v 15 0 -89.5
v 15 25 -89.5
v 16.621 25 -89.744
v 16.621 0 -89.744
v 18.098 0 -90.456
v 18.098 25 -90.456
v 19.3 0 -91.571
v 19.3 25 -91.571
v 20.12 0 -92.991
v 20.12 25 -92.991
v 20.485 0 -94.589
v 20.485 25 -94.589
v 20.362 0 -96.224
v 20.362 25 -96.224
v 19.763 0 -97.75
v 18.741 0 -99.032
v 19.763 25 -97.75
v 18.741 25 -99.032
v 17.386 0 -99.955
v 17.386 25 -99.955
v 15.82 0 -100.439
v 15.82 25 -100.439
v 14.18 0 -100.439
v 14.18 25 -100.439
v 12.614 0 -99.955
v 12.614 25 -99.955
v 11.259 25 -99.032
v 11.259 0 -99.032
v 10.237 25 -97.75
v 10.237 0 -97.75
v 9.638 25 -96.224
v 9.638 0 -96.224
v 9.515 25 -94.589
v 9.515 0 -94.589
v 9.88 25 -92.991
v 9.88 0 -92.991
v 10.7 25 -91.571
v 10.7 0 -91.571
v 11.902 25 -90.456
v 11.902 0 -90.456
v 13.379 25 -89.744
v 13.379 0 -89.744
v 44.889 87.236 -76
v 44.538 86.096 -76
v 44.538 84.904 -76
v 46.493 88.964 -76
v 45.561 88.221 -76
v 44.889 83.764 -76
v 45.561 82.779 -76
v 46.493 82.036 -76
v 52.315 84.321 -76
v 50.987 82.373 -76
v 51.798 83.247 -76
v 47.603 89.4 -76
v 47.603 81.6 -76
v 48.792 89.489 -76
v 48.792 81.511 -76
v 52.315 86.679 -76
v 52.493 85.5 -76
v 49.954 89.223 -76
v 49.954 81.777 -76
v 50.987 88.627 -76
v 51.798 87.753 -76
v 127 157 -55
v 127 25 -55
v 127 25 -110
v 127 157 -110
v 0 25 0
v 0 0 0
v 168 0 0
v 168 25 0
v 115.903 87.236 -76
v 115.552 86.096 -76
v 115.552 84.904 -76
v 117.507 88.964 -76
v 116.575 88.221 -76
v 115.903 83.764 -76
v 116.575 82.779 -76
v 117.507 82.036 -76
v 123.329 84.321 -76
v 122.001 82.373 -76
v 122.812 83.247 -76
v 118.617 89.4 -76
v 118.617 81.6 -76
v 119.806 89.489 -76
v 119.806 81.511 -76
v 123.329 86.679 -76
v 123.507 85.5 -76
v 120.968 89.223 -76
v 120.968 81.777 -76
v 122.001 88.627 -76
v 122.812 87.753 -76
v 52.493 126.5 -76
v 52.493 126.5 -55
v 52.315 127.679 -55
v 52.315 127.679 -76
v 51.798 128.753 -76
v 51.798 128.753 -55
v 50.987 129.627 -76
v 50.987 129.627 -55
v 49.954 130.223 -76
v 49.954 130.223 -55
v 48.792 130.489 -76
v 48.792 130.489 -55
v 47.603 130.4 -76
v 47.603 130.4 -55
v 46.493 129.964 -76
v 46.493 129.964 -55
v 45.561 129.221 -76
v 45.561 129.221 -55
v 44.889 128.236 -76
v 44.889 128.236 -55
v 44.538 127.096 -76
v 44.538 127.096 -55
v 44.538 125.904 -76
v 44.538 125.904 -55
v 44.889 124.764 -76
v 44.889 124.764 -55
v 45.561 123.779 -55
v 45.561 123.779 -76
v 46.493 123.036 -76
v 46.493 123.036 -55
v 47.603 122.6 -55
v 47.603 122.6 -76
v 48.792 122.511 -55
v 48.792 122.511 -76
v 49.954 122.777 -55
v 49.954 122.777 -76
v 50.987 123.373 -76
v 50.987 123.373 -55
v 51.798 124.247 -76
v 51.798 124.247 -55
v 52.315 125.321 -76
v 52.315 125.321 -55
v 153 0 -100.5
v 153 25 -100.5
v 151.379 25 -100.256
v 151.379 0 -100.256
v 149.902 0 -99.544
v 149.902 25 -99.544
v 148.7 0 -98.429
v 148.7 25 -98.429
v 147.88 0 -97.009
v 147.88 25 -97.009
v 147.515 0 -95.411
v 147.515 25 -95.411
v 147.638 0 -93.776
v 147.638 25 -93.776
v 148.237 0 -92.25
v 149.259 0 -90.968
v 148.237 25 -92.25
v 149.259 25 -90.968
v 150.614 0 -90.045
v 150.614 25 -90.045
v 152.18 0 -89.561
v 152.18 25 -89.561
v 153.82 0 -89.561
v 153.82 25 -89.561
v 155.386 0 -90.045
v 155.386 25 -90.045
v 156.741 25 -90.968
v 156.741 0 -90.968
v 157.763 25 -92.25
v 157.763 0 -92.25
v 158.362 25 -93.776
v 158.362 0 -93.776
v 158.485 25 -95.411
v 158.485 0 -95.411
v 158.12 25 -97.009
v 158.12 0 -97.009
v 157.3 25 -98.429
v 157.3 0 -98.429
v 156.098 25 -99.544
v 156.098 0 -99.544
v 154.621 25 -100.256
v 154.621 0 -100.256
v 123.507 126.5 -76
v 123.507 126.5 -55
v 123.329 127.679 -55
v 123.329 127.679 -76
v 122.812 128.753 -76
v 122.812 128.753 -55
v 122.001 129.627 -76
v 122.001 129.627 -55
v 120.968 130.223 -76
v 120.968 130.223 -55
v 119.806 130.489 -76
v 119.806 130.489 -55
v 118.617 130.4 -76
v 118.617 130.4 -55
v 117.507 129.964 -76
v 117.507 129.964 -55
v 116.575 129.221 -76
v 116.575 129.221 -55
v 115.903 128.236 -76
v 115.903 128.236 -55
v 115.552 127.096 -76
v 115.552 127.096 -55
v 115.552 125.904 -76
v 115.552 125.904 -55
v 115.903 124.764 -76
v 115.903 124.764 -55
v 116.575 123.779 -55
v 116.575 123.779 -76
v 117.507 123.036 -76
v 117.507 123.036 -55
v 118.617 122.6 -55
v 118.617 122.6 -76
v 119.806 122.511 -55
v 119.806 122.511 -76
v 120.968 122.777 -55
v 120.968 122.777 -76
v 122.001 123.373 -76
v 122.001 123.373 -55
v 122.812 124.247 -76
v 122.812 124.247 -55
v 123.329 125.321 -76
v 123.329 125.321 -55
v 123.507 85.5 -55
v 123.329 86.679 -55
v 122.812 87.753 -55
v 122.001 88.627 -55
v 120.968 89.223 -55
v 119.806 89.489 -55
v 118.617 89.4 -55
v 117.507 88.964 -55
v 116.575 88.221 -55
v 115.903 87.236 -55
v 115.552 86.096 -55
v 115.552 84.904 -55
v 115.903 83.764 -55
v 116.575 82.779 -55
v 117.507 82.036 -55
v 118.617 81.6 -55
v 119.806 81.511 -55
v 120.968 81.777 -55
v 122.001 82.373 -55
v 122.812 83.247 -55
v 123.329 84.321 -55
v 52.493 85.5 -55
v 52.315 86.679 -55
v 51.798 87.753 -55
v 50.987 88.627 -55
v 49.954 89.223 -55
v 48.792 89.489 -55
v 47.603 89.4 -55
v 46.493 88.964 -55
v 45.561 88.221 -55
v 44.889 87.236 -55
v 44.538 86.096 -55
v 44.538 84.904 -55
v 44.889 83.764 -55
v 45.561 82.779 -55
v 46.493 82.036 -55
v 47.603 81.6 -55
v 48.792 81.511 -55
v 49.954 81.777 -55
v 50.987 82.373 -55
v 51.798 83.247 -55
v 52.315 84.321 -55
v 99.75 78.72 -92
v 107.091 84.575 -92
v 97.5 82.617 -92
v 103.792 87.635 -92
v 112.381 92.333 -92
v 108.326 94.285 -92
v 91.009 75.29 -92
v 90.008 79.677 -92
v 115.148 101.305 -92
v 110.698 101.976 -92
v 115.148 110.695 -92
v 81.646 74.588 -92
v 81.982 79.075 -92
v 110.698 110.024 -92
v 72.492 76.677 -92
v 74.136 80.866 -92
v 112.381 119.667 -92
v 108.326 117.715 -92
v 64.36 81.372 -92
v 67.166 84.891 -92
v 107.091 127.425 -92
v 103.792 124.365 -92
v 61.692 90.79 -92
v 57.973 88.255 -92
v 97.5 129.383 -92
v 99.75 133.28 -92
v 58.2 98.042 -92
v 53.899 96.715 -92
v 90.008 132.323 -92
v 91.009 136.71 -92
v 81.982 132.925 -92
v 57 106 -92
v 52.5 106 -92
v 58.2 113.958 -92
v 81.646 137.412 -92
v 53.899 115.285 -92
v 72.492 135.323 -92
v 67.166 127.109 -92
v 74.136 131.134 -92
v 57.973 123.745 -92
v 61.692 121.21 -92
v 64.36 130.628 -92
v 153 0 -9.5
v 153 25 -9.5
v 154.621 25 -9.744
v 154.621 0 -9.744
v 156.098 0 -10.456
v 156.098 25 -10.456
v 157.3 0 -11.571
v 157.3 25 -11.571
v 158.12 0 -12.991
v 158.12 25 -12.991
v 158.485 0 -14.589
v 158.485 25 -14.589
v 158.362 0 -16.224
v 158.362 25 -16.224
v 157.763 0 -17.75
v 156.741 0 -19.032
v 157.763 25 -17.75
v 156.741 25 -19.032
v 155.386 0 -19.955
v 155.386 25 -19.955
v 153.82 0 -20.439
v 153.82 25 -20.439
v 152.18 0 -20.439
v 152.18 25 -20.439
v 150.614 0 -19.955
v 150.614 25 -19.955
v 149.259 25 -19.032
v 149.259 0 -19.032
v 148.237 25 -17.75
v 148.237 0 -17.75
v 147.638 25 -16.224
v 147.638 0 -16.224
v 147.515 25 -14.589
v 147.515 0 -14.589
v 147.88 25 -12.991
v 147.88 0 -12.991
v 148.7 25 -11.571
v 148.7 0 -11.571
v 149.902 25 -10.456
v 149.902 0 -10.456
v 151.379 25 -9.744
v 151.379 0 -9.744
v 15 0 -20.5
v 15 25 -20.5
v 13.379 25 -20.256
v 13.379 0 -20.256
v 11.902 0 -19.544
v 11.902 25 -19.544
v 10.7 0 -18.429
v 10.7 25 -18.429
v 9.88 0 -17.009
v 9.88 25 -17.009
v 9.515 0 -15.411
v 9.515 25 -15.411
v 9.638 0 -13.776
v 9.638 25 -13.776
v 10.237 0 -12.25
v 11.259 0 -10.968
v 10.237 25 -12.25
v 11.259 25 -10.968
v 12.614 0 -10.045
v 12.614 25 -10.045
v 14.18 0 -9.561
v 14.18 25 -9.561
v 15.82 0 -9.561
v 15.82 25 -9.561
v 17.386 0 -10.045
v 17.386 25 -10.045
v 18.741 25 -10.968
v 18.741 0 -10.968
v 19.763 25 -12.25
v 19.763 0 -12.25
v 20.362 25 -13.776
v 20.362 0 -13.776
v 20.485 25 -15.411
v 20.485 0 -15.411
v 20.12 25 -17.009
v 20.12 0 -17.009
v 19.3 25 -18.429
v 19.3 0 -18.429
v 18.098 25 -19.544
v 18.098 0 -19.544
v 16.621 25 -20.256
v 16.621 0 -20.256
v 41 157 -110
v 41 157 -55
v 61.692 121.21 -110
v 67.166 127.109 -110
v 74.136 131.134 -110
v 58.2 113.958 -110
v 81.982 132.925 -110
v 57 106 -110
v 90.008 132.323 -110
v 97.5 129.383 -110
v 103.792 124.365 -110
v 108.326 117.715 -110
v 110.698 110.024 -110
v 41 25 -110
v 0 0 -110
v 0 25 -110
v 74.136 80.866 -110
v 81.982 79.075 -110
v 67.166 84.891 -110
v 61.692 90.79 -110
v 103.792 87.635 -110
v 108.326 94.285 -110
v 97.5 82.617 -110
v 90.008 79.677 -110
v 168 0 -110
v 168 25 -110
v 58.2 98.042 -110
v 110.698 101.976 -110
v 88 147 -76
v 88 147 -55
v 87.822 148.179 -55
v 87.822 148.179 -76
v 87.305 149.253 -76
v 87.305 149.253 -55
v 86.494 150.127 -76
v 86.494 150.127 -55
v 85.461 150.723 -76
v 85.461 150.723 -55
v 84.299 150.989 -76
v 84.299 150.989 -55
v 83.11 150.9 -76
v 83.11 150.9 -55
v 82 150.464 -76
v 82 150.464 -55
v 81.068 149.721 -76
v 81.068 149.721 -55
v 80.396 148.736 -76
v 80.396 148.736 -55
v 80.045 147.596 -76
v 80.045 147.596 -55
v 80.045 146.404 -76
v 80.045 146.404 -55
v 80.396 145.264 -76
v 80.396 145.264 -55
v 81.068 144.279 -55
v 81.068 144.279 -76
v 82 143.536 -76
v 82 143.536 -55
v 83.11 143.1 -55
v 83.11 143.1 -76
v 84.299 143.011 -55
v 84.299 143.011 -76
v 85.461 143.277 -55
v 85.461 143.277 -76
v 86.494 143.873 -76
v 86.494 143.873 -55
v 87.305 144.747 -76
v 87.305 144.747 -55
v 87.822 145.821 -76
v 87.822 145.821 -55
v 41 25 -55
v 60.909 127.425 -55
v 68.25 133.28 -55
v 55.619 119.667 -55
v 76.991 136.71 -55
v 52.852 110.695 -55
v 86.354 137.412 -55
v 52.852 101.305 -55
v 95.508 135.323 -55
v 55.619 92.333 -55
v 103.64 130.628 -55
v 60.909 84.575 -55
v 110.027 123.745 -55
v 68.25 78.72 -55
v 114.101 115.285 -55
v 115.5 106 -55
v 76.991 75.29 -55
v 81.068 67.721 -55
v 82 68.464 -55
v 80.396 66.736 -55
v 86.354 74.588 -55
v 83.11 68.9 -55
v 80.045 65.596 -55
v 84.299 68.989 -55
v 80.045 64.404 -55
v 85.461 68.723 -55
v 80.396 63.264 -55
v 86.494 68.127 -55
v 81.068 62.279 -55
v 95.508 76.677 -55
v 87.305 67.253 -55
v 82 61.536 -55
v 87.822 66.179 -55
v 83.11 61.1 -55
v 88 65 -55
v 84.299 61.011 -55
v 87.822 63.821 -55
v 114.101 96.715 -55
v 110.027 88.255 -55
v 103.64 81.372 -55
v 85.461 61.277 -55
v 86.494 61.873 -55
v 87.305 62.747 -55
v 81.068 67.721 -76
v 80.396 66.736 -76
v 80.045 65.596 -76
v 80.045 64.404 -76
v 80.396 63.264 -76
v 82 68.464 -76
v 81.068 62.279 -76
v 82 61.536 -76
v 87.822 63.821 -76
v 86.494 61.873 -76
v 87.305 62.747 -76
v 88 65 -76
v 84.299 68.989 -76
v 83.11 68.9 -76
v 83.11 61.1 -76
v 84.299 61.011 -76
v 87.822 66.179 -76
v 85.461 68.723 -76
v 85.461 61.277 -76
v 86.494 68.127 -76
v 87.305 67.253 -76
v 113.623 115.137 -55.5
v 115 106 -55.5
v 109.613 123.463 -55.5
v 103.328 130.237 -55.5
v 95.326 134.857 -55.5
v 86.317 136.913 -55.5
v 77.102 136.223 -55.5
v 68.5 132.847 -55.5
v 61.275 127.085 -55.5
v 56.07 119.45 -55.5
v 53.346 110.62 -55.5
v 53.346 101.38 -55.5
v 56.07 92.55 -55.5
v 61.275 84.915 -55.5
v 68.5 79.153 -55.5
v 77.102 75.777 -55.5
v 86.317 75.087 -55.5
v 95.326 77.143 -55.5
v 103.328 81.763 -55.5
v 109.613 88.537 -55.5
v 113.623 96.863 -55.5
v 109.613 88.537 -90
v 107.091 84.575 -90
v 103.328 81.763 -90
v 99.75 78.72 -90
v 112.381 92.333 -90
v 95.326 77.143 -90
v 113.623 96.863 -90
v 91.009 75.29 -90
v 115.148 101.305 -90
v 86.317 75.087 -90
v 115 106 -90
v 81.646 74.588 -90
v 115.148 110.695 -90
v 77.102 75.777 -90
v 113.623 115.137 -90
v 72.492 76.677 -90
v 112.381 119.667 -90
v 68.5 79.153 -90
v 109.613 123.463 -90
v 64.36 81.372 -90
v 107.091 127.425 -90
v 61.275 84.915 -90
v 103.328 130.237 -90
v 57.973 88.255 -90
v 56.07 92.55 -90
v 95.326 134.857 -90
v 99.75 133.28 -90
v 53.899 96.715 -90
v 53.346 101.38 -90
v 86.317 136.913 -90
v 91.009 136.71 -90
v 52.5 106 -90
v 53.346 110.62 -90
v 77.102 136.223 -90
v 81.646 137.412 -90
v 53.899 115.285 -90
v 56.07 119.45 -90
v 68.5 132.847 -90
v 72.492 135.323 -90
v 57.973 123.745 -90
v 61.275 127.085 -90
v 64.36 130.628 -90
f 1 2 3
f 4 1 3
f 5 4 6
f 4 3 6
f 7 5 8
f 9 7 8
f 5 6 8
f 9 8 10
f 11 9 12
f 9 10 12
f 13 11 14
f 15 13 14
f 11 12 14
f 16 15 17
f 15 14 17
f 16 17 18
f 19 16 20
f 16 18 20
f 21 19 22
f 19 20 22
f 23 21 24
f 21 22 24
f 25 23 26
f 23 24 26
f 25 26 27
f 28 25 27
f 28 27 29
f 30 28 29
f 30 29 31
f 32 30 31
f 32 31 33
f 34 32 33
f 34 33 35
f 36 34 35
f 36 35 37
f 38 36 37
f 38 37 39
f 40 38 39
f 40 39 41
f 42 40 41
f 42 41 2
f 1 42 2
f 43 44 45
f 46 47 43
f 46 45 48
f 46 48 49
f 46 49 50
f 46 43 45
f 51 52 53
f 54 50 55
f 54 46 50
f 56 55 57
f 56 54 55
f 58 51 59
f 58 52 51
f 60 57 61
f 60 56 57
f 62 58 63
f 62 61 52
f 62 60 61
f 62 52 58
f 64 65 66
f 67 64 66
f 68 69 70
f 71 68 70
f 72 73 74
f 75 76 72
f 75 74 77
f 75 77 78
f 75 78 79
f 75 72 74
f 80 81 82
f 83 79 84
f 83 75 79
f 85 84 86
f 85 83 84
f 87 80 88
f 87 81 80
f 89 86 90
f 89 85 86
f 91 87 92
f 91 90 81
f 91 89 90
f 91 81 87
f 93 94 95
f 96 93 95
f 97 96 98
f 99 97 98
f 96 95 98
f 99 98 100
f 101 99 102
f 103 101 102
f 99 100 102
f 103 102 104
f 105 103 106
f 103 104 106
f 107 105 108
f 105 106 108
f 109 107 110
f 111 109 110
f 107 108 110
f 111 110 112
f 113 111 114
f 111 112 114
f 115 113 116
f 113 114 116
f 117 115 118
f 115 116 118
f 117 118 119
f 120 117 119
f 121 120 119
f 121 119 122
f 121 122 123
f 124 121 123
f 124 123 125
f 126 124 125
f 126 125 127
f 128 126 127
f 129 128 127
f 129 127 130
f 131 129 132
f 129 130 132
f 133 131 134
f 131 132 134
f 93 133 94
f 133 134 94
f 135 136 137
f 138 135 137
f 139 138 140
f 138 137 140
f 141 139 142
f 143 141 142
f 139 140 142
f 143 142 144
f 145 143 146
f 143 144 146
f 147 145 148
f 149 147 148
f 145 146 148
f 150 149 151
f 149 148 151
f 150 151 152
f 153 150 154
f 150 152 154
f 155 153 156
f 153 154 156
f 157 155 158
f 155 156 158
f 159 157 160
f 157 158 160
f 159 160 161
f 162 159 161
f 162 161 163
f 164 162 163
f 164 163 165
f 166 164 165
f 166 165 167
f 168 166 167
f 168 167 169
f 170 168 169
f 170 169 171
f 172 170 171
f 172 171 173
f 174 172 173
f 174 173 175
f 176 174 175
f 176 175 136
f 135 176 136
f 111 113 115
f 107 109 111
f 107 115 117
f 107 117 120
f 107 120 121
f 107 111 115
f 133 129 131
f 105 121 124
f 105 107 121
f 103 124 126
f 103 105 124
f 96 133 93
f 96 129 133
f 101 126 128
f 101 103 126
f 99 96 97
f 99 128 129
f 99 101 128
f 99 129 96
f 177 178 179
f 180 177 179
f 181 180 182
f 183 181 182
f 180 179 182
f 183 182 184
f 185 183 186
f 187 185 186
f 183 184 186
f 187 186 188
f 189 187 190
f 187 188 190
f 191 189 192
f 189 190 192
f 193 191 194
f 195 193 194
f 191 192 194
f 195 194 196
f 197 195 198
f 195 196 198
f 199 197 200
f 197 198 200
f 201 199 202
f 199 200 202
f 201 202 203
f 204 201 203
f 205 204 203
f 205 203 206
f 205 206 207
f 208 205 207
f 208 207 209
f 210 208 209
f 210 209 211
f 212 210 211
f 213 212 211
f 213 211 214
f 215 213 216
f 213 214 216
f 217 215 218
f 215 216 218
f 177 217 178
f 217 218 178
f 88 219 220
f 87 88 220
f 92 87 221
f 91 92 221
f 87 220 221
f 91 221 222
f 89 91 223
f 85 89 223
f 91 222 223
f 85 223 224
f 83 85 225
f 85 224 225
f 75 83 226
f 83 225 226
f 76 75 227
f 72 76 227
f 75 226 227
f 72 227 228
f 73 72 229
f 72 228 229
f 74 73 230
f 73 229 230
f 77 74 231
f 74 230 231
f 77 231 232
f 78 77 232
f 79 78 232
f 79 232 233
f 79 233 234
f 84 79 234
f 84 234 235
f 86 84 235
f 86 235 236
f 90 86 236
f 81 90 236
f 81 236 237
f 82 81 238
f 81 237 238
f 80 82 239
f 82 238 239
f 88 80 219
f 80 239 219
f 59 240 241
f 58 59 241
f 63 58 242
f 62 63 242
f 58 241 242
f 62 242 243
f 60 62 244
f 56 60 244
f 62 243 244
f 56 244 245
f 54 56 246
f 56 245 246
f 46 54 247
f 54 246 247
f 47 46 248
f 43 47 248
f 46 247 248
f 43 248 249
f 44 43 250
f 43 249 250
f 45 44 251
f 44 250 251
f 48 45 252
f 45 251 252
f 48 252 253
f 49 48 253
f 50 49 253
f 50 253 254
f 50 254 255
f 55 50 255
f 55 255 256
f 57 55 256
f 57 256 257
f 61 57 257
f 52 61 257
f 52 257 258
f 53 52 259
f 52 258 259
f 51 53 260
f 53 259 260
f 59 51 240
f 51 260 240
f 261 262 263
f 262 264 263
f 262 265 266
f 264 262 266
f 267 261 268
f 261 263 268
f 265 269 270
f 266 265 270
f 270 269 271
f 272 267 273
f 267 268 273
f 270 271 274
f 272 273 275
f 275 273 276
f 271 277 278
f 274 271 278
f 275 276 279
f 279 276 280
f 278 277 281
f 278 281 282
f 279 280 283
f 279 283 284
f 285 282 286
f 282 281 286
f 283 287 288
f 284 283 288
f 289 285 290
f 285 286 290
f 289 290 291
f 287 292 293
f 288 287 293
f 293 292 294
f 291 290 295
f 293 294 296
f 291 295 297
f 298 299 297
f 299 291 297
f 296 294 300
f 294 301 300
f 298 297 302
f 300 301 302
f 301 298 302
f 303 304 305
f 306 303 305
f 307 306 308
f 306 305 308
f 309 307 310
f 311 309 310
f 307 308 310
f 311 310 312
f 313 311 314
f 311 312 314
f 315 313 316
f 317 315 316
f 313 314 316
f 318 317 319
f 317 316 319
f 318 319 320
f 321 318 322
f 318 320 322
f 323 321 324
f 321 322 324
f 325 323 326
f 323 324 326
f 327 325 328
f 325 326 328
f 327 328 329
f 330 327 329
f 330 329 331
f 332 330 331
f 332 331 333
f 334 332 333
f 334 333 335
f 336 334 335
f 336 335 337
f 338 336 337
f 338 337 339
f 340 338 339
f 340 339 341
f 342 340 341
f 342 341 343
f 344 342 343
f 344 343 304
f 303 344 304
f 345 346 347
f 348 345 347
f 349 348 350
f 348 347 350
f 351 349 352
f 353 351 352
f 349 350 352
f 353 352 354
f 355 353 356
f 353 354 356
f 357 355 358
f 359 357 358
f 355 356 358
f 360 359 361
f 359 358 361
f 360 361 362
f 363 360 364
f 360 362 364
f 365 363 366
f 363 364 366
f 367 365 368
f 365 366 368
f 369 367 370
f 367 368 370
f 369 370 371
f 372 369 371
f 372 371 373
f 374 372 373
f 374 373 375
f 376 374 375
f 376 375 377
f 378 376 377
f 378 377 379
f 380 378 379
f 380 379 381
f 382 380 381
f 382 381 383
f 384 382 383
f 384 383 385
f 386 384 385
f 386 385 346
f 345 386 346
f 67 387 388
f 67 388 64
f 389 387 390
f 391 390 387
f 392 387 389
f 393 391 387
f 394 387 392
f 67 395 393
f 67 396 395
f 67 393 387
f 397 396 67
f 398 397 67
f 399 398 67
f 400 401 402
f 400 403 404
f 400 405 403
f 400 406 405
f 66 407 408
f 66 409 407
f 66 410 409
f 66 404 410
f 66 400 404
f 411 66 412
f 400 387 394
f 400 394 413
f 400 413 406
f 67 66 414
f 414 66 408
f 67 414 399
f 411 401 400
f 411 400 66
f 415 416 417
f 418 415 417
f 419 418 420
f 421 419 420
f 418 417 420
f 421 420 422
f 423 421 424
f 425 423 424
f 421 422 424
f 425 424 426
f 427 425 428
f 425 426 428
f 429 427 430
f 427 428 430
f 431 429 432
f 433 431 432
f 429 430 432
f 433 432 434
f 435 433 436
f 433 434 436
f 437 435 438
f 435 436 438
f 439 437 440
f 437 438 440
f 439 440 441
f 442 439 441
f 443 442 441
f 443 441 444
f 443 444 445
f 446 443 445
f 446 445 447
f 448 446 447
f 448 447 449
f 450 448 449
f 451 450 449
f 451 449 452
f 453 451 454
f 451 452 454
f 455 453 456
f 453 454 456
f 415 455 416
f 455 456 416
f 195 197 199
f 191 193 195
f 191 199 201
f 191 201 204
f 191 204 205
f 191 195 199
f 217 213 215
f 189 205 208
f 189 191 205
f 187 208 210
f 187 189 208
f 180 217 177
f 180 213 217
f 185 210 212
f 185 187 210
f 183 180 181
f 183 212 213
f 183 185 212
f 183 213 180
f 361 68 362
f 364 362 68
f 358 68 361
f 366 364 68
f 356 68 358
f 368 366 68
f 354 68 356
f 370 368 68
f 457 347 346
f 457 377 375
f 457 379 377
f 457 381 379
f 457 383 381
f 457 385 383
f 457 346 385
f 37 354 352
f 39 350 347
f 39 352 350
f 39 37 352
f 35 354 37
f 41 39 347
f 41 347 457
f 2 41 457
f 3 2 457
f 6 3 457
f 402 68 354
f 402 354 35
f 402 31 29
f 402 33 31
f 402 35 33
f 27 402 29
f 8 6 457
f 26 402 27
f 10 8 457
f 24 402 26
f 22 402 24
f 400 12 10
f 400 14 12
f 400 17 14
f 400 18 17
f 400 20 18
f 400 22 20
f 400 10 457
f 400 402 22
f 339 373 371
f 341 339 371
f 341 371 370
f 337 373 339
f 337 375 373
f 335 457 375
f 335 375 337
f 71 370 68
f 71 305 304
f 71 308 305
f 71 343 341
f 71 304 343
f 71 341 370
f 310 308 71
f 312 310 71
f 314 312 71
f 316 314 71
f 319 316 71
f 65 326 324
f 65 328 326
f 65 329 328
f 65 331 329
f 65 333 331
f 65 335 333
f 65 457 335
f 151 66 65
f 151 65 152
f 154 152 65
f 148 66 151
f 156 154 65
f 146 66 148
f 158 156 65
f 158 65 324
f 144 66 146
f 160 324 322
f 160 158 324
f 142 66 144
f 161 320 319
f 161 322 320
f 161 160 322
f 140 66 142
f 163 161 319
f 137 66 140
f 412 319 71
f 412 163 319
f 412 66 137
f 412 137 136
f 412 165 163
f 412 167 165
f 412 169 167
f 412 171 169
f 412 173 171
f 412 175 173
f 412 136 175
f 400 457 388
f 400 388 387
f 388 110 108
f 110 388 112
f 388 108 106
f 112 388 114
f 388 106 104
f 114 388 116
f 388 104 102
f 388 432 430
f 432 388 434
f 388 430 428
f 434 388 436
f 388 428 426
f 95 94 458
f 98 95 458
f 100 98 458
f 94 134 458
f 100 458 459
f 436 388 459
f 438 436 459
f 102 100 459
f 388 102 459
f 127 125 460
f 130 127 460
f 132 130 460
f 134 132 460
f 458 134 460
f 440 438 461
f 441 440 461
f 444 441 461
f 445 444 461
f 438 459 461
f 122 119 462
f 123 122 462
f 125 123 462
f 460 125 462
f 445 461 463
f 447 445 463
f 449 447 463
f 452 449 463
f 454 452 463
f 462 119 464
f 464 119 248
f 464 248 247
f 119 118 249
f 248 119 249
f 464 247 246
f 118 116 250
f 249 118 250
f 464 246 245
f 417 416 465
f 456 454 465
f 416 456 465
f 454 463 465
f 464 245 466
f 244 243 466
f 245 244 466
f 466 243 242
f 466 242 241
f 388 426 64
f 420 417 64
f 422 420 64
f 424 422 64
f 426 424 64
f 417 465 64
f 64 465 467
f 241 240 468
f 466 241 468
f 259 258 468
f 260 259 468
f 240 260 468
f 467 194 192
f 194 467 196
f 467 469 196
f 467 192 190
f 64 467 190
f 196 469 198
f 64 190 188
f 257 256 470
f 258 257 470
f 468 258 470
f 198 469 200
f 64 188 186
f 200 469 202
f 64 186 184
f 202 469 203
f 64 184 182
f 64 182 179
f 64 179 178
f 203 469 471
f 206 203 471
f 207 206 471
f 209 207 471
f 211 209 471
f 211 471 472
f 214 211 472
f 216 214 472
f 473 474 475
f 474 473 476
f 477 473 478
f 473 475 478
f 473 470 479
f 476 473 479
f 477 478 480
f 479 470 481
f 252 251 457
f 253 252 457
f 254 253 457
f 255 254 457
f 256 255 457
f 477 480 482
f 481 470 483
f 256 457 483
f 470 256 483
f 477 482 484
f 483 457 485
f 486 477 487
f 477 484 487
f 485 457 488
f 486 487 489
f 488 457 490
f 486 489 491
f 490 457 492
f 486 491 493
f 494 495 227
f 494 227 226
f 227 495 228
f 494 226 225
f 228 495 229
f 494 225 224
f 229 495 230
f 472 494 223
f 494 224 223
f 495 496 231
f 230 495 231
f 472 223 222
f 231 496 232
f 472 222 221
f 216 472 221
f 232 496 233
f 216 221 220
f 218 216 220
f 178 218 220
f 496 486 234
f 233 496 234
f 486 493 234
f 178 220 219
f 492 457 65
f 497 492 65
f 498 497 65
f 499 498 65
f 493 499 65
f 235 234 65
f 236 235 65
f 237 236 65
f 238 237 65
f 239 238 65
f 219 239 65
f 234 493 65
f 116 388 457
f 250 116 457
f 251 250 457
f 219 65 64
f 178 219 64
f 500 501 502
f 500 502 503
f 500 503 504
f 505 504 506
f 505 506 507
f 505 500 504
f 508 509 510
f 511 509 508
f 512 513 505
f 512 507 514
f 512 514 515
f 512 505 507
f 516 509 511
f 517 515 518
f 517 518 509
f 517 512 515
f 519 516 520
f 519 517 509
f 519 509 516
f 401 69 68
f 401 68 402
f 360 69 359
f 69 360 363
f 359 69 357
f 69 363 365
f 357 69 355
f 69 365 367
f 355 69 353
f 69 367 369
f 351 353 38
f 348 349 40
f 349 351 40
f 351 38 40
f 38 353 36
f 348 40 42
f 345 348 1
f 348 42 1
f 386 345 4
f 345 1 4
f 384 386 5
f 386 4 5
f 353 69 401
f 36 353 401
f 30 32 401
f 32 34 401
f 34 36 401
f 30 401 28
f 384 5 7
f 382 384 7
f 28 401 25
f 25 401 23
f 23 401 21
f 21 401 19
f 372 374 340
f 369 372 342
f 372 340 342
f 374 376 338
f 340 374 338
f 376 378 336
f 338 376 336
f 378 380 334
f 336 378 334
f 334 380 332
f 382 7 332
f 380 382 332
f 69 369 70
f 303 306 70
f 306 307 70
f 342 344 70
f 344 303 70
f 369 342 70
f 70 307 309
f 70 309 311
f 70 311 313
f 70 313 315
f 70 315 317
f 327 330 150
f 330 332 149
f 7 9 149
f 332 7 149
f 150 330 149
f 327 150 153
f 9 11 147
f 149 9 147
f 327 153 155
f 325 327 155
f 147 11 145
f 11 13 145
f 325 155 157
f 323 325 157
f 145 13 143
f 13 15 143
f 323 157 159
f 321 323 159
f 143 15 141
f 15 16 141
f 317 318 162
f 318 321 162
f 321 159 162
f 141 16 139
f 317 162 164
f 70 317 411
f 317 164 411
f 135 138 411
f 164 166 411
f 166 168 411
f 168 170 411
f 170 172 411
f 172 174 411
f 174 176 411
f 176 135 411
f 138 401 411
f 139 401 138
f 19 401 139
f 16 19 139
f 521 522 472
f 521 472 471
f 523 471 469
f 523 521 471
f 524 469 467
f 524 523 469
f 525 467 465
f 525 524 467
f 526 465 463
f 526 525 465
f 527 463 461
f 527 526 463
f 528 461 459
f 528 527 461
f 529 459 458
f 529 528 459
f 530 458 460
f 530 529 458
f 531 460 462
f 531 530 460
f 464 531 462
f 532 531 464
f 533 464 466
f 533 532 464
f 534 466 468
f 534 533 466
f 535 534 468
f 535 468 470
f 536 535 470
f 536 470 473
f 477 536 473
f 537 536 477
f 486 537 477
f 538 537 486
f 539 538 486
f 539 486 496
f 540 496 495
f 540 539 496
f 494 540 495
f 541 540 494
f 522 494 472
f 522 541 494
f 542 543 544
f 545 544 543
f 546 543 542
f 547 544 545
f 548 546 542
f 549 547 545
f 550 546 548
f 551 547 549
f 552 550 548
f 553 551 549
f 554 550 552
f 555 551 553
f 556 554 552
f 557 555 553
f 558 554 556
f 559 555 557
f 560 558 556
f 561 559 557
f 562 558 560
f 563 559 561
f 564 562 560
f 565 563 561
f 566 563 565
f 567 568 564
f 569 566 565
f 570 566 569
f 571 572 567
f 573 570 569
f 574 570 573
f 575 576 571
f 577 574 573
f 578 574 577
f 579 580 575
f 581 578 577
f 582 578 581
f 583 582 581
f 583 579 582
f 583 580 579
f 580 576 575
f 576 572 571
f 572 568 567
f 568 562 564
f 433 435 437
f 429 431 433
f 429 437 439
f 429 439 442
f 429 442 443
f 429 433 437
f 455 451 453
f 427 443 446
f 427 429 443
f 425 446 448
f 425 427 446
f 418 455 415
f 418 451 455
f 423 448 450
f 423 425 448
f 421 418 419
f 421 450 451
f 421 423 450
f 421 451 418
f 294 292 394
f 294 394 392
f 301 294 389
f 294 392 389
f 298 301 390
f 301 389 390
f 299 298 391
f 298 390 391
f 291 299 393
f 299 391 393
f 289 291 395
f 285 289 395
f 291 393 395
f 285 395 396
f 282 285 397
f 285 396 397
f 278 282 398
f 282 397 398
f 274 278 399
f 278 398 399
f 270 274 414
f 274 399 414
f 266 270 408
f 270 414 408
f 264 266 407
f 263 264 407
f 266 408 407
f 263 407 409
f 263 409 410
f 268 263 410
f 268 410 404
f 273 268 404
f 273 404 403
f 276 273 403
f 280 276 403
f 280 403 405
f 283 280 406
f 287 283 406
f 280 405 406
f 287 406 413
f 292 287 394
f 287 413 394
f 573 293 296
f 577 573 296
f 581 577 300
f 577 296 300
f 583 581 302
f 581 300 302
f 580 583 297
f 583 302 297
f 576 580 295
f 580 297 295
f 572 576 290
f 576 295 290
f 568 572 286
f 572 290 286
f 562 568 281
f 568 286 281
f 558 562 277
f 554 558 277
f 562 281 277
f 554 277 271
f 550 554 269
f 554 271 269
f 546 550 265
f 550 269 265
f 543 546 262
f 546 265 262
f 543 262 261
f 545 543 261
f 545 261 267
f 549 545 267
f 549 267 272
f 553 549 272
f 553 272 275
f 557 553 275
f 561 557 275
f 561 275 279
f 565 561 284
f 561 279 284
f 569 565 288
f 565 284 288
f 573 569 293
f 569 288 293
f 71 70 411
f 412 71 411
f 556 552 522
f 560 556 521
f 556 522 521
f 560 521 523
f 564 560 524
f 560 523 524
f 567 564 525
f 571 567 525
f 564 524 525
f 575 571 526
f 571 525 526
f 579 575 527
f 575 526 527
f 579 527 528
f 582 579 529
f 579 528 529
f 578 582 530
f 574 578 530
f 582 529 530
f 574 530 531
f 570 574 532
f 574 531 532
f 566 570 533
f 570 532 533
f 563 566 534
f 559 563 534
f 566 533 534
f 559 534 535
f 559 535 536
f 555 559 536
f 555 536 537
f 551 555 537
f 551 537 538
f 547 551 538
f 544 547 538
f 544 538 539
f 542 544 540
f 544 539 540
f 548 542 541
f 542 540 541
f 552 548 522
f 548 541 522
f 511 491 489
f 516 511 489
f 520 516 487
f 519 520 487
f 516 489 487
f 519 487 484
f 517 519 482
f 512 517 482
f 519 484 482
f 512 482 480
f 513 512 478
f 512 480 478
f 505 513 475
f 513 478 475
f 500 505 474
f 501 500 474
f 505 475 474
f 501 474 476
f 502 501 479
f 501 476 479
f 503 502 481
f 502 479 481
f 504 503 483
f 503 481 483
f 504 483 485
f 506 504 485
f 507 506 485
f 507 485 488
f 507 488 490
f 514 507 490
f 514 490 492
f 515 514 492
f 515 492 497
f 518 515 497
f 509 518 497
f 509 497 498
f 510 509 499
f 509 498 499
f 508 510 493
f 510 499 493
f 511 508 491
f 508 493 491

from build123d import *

# Parameters (mm, degrees)
SKETCH_1_W          = 168
SKETCH_1_H          = 110
EXTRUDE_1_DEPTH     = 25
SKETCH_2_R          = 5.5
CUT_EXTRUDE_1_DEPTH = 203.358592602
SKETCH_3_W          = 86
SKETCH_3_H          = 55
EXTRUDE_2_DEPTH     = 132
SKETCH_4_R          = 31
CUT_EXTRUDE_2_DEPTH = 35
CHAMFER_1_SIZE      = 0.5
SKETCH_24_R         = 27
CUT_EXTRUDE_6_DEPTH = 18
SKETCH_25_R         = 31.5
CUT_EXTRUDE_7_DEPTH = 2
SKETCH_26_R         = 4
CUT_EXTRUDE_8_DEPTH = 21


with BuildPart() as part:
    # 草图1 → 凸台-拉伸1 (new body)
    with BuildSketch(Plane(origin=(0, 0, 0), x_dir=(1, 0, 0), z_dir=(0, 1, 0))):
        with Locations((84, 55)):
            Rectangle(SKETCH_1_W, SKETCH_1_H)
    extrude(amount=EXTRUDE_1_DEPTH)

    # 草图2 → 切除-拉伸1 (cut, through all)
    with BuildSketch(Plane(origin=(0, 25, 0), x_dir=(1, 0, 0), z_dir=(0, 1, 0))):
        with Locations(Location((15, 95, 0), (0, 0, 270))):
            Circle(SKETCH_2_R)
        with Locations(Location((153, 95, 0), (0, 0, 90))):
            Circle(SKETCH_2_R)
        with Locations(Location((153, 15, 0), (0, 0, 270))):
            Circle(SKETCH_2_R)
        with Locations(Location((15, 15, 0), (0, 0, 90))):
            Circle(SKETCH_2_R)
    extrude(amount=-CUT_EXTRUDE_1_DEPTH, mode=Mode.SUBTRACT)

    # 草图3 → 凸台-拉伸2 (add)
    with BuildSketch(Plane(origin=(0, 25, 0), x_dir=(1, 0, 0), z_dir=(0, 1, 0))):
        with Locations((84, 82.5)):
            Rectangle(SKETCH_3_W, SKETCH_3_H)
    extrude(amount=EXTRUDE_2_DEPTH)

    # 草图4 → 切除-拉伸2 (cut)
    with BuildSketch(Plane.XY.offset(-55)):
        with Locations((84, 106)):
            Circle(SKETCH_4_R)
    extrude(amount=-CUT_EXTRUDE_2_DEPTH, mode=Mode.SUBTRACT)

    # 倒角1
    chamfer_1_edges = [part.edges().sort_by_distance(p)[0] for p in [
        (53, 106, -55),
    ]]
    chamfer(chamfer_1_edges, length=CHAMFER_1_SIZE)

    # 草图24 → 切除-拉伸6 (cut)
    with BuildSketch(Plane(origin=(0, 0, -110), x_dir=(-1, 0, 0), z_dir=(0, 0, -1))):
        with Locations((-84, 106)):
            Circle(SKETCH_24_R)
    extrude(amount=-CUT_EXTRUDE_6_DEPTH, mode=Mode.SUBTRACT)

    # 草图25 → 切除-拉伸7 (cut)
    with BuildSketch(Plane(origin=(0, 0, -92), x_dir=(-1, 0, 0), z_dir=(0, 0, -1))):
        with Locations((-84, 106)):
            Circle(SKETCH_25_R)
    extrude(amount=-CUT_EXTRUDE_7_DEPTH, mode=Mode.SUBTRACT)

    # 草图26 → 切除-拉伸8 (cut)
    with BuildSketch(Plane.XY.offset(-55)):
        with Locations((84, 147)):
            Circle(SKETCH_26_R)
        with Locations((119.507041555, 126.5)):
            Circle(SKETCH_26_R)
        with Locations((119.507041555, 85.5)):
            Circle(SKETCH_26_R)
        with Locations((84, 65)):
            Circle(SKETCH_26_R)
        with Locations((48.492958445, 85.5)):
            Circle(SKETCH_26_R)
        with Locations((48.492958445, 126.5)):
            Circle(SKETCH_26_R)
    extrude(amount=-CUT_EXTRUDE_8_DEPTH, mode=Mode.SUBTRACT)


solid = part.part
